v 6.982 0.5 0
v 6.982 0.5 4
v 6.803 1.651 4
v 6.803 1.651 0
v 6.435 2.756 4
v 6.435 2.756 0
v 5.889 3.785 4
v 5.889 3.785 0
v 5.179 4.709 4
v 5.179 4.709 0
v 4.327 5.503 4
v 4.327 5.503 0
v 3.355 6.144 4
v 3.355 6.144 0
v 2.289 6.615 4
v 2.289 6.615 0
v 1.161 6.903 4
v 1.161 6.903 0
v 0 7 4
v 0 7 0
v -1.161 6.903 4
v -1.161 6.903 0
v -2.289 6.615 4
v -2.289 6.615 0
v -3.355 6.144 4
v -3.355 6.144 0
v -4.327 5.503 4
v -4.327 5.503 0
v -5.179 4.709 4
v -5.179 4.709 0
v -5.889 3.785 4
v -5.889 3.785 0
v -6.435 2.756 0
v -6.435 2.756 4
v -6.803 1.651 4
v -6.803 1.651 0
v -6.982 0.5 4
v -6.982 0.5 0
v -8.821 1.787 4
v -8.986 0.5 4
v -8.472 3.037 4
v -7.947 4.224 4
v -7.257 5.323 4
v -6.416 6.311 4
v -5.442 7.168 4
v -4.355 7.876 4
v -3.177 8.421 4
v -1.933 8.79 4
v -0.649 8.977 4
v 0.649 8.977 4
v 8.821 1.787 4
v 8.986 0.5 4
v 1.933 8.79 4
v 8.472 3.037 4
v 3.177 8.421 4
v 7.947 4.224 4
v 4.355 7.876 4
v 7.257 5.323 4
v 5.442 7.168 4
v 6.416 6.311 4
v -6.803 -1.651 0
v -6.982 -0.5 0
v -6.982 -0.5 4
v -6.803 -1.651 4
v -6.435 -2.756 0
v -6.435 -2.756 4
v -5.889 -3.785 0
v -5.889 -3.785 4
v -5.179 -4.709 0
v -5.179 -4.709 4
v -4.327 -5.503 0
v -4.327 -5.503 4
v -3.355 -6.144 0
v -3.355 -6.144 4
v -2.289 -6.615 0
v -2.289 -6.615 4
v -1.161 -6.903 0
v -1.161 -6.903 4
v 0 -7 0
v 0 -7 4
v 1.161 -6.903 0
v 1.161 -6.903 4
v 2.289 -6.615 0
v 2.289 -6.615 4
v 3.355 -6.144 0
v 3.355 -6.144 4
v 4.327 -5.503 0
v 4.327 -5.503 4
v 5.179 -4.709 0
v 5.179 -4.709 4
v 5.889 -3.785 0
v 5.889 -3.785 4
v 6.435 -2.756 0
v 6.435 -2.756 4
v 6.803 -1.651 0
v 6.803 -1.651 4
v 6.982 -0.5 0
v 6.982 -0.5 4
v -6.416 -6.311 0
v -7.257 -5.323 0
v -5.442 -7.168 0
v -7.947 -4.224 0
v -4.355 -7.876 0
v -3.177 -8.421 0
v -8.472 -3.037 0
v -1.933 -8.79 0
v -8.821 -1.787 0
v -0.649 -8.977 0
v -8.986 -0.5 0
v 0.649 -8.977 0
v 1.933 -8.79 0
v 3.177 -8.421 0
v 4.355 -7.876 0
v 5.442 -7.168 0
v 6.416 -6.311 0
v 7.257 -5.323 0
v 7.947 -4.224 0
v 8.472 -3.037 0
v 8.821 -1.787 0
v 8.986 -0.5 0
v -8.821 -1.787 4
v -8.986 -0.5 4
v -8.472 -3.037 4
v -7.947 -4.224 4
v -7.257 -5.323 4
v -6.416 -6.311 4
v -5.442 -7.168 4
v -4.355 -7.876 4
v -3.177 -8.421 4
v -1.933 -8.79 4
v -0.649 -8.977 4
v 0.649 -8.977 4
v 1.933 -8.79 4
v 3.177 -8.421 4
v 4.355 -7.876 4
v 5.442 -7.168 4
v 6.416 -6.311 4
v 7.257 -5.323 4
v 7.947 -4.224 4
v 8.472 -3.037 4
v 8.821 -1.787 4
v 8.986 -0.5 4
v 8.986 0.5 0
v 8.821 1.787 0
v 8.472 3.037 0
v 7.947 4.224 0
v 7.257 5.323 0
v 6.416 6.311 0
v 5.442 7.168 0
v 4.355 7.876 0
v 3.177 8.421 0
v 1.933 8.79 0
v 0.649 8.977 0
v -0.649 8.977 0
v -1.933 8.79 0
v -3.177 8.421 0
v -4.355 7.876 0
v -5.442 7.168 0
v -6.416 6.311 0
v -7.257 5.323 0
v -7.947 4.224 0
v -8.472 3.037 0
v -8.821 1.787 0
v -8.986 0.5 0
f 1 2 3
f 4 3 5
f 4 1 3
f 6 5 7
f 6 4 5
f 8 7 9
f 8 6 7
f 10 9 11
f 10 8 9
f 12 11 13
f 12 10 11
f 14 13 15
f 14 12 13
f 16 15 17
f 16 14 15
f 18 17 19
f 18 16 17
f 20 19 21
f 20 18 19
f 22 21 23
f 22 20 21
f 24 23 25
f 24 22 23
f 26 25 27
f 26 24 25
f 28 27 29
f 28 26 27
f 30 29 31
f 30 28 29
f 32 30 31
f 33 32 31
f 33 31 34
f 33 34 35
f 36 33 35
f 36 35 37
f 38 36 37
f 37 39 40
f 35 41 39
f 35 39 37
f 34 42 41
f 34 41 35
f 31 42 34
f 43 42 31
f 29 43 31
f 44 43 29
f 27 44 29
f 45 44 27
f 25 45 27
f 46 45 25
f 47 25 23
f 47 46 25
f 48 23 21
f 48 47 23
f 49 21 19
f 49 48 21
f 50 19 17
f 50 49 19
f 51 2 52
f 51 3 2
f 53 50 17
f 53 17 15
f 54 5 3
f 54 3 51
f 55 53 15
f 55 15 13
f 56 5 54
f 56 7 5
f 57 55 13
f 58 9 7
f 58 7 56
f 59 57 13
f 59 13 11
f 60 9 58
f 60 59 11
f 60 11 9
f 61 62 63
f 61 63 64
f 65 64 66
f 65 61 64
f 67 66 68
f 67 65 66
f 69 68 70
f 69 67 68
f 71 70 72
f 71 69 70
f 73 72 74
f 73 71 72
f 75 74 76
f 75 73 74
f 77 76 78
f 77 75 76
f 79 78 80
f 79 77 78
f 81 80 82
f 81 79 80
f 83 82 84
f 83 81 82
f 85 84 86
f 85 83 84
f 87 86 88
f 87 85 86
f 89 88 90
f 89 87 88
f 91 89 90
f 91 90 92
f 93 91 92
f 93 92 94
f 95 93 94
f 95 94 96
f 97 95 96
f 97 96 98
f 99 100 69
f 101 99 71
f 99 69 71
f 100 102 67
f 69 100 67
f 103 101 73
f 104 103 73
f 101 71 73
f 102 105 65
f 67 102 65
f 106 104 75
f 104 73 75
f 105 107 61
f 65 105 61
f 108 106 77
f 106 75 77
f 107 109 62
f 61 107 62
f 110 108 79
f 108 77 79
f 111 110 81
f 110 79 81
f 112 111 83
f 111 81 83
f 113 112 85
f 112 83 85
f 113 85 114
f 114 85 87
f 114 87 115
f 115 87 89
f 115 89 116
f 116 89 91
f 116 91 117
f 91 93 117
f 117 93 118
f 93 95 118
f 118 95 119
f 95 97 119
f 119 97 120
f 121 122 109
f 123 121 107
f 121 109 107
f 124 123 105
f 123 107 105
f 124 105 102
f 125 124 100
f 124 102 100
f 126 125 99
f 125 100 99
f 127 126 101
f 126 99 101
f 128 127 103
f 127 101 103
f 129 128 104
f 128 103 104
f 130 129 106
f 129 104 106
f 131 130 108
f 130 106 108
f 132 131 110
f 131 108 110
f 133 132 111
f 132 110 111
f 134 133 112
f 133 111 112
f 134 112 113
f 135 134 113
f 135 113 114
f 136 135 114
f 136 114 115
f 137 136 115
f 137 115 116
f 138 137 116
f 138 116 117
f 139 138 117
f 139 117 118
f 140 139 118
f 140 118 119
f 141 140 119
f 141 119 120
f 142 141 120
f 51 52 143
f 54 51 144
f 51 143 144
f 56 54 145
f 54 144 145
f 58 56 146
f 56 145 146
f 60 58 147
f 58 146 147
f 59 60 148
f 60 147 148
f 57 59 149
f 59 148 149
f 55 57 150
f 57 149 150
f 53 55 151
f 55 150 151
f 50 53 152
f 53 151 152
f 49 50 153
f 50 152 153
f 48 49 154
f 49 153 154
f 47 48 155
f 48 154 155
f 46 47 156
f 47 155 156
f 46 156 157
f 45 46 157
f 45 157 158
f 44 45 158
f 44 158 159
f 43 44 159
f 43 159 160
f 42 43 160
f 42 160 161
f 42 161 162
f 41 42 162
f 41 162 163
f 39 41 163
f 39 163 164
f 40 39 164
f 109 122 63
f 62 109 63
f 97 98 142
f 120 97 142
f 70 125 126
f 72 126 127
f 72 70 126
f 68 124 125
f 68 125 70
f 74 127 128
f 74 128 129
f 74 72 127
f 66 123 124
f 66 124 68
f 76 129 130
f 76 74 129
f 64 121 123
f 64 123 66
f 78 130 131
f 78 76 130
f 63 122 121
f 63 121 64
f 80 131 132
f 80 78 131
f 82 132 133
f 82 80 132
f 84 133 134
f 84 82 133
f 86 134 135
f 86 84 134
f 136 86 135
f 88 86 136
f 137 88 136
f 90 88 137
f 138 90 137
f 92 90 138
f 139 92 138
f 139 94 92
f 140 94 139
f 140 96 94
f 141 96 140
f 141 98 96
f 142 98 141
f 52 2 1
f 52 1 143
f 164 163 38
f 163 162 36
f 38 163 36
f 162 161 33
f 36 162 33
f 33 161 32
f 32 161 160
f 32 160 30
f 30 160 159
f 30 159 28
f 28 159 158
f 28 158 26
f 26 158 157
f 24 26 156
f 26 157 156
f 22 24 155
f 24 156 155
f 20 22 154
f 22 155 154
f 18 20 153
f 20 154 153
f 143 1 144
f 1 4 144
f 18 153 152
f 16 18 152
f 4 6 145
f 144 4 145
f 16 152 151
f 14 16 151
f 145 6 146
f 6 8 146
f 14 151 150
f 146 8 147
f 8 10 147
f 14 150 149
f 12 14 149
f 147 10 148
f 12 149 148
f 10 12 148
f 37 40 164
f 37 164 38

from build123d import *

# Parameters (mm, degrees)
SKIZZE1_R                       = 9
SKIZZE1_R_2                     = 7
AUFSATZ_LINEAR_AUSTRAGEN1_DEPTH = 4
SKIZZE2_W                       = 27.54683789
SKIZZE2_H                       = 1
SCHNITT_LINEAR_AUSTRAGEN1_DEPTH = 10


with BuildPart() as part:
    # Skizze1 → Aufsatz-Linear austragen1 (new body)
    with BuildSketch(Plane.XY):
        Circle(SKIZZE1_R)
        Circle(SKIZZE1_R_2, mode=Mode.SUBTRACT)
    extrude(amount=AUFSATZ_LINEAR_AUSTRAGEN1_DEPTH)

    # Skizze2 → Schnitt-Linear austragen1 (cut)
    with BuildSketch(Plane.XY.offset(4)):
        Rectangle(SKIZZE2_W, SKIZZE2_H)
    extrude(amount=-SCHNITT_LINEAR_AUSTRAGEN1_DEPTH, mode=Mode.SUBTRACT)


with BuildPart() as schnitt_linear_austragen1_piece_1:
    # of the separate pieces the step leaves, piece 1, a body of its own (schnitt_linear_austragen1_pieces)
    add(part.part.solids().sort_by_distance((-8.986100378, -0.5, 0))[0])


with BuildPart() as schnitt_linear_austragen1_piece_2:
    # of the separate pieces the step leaves, piece 2, a body of its own (schnitt_linear_austragen1_pieces)
    add(part.part.solids().sort_by_distance((8.986100378, 0.5, 0))[0])


solid = Compound([schnitt_linear_austragen1_piece_1.part, schnitt_linear_austragen1_piece_2.part])
